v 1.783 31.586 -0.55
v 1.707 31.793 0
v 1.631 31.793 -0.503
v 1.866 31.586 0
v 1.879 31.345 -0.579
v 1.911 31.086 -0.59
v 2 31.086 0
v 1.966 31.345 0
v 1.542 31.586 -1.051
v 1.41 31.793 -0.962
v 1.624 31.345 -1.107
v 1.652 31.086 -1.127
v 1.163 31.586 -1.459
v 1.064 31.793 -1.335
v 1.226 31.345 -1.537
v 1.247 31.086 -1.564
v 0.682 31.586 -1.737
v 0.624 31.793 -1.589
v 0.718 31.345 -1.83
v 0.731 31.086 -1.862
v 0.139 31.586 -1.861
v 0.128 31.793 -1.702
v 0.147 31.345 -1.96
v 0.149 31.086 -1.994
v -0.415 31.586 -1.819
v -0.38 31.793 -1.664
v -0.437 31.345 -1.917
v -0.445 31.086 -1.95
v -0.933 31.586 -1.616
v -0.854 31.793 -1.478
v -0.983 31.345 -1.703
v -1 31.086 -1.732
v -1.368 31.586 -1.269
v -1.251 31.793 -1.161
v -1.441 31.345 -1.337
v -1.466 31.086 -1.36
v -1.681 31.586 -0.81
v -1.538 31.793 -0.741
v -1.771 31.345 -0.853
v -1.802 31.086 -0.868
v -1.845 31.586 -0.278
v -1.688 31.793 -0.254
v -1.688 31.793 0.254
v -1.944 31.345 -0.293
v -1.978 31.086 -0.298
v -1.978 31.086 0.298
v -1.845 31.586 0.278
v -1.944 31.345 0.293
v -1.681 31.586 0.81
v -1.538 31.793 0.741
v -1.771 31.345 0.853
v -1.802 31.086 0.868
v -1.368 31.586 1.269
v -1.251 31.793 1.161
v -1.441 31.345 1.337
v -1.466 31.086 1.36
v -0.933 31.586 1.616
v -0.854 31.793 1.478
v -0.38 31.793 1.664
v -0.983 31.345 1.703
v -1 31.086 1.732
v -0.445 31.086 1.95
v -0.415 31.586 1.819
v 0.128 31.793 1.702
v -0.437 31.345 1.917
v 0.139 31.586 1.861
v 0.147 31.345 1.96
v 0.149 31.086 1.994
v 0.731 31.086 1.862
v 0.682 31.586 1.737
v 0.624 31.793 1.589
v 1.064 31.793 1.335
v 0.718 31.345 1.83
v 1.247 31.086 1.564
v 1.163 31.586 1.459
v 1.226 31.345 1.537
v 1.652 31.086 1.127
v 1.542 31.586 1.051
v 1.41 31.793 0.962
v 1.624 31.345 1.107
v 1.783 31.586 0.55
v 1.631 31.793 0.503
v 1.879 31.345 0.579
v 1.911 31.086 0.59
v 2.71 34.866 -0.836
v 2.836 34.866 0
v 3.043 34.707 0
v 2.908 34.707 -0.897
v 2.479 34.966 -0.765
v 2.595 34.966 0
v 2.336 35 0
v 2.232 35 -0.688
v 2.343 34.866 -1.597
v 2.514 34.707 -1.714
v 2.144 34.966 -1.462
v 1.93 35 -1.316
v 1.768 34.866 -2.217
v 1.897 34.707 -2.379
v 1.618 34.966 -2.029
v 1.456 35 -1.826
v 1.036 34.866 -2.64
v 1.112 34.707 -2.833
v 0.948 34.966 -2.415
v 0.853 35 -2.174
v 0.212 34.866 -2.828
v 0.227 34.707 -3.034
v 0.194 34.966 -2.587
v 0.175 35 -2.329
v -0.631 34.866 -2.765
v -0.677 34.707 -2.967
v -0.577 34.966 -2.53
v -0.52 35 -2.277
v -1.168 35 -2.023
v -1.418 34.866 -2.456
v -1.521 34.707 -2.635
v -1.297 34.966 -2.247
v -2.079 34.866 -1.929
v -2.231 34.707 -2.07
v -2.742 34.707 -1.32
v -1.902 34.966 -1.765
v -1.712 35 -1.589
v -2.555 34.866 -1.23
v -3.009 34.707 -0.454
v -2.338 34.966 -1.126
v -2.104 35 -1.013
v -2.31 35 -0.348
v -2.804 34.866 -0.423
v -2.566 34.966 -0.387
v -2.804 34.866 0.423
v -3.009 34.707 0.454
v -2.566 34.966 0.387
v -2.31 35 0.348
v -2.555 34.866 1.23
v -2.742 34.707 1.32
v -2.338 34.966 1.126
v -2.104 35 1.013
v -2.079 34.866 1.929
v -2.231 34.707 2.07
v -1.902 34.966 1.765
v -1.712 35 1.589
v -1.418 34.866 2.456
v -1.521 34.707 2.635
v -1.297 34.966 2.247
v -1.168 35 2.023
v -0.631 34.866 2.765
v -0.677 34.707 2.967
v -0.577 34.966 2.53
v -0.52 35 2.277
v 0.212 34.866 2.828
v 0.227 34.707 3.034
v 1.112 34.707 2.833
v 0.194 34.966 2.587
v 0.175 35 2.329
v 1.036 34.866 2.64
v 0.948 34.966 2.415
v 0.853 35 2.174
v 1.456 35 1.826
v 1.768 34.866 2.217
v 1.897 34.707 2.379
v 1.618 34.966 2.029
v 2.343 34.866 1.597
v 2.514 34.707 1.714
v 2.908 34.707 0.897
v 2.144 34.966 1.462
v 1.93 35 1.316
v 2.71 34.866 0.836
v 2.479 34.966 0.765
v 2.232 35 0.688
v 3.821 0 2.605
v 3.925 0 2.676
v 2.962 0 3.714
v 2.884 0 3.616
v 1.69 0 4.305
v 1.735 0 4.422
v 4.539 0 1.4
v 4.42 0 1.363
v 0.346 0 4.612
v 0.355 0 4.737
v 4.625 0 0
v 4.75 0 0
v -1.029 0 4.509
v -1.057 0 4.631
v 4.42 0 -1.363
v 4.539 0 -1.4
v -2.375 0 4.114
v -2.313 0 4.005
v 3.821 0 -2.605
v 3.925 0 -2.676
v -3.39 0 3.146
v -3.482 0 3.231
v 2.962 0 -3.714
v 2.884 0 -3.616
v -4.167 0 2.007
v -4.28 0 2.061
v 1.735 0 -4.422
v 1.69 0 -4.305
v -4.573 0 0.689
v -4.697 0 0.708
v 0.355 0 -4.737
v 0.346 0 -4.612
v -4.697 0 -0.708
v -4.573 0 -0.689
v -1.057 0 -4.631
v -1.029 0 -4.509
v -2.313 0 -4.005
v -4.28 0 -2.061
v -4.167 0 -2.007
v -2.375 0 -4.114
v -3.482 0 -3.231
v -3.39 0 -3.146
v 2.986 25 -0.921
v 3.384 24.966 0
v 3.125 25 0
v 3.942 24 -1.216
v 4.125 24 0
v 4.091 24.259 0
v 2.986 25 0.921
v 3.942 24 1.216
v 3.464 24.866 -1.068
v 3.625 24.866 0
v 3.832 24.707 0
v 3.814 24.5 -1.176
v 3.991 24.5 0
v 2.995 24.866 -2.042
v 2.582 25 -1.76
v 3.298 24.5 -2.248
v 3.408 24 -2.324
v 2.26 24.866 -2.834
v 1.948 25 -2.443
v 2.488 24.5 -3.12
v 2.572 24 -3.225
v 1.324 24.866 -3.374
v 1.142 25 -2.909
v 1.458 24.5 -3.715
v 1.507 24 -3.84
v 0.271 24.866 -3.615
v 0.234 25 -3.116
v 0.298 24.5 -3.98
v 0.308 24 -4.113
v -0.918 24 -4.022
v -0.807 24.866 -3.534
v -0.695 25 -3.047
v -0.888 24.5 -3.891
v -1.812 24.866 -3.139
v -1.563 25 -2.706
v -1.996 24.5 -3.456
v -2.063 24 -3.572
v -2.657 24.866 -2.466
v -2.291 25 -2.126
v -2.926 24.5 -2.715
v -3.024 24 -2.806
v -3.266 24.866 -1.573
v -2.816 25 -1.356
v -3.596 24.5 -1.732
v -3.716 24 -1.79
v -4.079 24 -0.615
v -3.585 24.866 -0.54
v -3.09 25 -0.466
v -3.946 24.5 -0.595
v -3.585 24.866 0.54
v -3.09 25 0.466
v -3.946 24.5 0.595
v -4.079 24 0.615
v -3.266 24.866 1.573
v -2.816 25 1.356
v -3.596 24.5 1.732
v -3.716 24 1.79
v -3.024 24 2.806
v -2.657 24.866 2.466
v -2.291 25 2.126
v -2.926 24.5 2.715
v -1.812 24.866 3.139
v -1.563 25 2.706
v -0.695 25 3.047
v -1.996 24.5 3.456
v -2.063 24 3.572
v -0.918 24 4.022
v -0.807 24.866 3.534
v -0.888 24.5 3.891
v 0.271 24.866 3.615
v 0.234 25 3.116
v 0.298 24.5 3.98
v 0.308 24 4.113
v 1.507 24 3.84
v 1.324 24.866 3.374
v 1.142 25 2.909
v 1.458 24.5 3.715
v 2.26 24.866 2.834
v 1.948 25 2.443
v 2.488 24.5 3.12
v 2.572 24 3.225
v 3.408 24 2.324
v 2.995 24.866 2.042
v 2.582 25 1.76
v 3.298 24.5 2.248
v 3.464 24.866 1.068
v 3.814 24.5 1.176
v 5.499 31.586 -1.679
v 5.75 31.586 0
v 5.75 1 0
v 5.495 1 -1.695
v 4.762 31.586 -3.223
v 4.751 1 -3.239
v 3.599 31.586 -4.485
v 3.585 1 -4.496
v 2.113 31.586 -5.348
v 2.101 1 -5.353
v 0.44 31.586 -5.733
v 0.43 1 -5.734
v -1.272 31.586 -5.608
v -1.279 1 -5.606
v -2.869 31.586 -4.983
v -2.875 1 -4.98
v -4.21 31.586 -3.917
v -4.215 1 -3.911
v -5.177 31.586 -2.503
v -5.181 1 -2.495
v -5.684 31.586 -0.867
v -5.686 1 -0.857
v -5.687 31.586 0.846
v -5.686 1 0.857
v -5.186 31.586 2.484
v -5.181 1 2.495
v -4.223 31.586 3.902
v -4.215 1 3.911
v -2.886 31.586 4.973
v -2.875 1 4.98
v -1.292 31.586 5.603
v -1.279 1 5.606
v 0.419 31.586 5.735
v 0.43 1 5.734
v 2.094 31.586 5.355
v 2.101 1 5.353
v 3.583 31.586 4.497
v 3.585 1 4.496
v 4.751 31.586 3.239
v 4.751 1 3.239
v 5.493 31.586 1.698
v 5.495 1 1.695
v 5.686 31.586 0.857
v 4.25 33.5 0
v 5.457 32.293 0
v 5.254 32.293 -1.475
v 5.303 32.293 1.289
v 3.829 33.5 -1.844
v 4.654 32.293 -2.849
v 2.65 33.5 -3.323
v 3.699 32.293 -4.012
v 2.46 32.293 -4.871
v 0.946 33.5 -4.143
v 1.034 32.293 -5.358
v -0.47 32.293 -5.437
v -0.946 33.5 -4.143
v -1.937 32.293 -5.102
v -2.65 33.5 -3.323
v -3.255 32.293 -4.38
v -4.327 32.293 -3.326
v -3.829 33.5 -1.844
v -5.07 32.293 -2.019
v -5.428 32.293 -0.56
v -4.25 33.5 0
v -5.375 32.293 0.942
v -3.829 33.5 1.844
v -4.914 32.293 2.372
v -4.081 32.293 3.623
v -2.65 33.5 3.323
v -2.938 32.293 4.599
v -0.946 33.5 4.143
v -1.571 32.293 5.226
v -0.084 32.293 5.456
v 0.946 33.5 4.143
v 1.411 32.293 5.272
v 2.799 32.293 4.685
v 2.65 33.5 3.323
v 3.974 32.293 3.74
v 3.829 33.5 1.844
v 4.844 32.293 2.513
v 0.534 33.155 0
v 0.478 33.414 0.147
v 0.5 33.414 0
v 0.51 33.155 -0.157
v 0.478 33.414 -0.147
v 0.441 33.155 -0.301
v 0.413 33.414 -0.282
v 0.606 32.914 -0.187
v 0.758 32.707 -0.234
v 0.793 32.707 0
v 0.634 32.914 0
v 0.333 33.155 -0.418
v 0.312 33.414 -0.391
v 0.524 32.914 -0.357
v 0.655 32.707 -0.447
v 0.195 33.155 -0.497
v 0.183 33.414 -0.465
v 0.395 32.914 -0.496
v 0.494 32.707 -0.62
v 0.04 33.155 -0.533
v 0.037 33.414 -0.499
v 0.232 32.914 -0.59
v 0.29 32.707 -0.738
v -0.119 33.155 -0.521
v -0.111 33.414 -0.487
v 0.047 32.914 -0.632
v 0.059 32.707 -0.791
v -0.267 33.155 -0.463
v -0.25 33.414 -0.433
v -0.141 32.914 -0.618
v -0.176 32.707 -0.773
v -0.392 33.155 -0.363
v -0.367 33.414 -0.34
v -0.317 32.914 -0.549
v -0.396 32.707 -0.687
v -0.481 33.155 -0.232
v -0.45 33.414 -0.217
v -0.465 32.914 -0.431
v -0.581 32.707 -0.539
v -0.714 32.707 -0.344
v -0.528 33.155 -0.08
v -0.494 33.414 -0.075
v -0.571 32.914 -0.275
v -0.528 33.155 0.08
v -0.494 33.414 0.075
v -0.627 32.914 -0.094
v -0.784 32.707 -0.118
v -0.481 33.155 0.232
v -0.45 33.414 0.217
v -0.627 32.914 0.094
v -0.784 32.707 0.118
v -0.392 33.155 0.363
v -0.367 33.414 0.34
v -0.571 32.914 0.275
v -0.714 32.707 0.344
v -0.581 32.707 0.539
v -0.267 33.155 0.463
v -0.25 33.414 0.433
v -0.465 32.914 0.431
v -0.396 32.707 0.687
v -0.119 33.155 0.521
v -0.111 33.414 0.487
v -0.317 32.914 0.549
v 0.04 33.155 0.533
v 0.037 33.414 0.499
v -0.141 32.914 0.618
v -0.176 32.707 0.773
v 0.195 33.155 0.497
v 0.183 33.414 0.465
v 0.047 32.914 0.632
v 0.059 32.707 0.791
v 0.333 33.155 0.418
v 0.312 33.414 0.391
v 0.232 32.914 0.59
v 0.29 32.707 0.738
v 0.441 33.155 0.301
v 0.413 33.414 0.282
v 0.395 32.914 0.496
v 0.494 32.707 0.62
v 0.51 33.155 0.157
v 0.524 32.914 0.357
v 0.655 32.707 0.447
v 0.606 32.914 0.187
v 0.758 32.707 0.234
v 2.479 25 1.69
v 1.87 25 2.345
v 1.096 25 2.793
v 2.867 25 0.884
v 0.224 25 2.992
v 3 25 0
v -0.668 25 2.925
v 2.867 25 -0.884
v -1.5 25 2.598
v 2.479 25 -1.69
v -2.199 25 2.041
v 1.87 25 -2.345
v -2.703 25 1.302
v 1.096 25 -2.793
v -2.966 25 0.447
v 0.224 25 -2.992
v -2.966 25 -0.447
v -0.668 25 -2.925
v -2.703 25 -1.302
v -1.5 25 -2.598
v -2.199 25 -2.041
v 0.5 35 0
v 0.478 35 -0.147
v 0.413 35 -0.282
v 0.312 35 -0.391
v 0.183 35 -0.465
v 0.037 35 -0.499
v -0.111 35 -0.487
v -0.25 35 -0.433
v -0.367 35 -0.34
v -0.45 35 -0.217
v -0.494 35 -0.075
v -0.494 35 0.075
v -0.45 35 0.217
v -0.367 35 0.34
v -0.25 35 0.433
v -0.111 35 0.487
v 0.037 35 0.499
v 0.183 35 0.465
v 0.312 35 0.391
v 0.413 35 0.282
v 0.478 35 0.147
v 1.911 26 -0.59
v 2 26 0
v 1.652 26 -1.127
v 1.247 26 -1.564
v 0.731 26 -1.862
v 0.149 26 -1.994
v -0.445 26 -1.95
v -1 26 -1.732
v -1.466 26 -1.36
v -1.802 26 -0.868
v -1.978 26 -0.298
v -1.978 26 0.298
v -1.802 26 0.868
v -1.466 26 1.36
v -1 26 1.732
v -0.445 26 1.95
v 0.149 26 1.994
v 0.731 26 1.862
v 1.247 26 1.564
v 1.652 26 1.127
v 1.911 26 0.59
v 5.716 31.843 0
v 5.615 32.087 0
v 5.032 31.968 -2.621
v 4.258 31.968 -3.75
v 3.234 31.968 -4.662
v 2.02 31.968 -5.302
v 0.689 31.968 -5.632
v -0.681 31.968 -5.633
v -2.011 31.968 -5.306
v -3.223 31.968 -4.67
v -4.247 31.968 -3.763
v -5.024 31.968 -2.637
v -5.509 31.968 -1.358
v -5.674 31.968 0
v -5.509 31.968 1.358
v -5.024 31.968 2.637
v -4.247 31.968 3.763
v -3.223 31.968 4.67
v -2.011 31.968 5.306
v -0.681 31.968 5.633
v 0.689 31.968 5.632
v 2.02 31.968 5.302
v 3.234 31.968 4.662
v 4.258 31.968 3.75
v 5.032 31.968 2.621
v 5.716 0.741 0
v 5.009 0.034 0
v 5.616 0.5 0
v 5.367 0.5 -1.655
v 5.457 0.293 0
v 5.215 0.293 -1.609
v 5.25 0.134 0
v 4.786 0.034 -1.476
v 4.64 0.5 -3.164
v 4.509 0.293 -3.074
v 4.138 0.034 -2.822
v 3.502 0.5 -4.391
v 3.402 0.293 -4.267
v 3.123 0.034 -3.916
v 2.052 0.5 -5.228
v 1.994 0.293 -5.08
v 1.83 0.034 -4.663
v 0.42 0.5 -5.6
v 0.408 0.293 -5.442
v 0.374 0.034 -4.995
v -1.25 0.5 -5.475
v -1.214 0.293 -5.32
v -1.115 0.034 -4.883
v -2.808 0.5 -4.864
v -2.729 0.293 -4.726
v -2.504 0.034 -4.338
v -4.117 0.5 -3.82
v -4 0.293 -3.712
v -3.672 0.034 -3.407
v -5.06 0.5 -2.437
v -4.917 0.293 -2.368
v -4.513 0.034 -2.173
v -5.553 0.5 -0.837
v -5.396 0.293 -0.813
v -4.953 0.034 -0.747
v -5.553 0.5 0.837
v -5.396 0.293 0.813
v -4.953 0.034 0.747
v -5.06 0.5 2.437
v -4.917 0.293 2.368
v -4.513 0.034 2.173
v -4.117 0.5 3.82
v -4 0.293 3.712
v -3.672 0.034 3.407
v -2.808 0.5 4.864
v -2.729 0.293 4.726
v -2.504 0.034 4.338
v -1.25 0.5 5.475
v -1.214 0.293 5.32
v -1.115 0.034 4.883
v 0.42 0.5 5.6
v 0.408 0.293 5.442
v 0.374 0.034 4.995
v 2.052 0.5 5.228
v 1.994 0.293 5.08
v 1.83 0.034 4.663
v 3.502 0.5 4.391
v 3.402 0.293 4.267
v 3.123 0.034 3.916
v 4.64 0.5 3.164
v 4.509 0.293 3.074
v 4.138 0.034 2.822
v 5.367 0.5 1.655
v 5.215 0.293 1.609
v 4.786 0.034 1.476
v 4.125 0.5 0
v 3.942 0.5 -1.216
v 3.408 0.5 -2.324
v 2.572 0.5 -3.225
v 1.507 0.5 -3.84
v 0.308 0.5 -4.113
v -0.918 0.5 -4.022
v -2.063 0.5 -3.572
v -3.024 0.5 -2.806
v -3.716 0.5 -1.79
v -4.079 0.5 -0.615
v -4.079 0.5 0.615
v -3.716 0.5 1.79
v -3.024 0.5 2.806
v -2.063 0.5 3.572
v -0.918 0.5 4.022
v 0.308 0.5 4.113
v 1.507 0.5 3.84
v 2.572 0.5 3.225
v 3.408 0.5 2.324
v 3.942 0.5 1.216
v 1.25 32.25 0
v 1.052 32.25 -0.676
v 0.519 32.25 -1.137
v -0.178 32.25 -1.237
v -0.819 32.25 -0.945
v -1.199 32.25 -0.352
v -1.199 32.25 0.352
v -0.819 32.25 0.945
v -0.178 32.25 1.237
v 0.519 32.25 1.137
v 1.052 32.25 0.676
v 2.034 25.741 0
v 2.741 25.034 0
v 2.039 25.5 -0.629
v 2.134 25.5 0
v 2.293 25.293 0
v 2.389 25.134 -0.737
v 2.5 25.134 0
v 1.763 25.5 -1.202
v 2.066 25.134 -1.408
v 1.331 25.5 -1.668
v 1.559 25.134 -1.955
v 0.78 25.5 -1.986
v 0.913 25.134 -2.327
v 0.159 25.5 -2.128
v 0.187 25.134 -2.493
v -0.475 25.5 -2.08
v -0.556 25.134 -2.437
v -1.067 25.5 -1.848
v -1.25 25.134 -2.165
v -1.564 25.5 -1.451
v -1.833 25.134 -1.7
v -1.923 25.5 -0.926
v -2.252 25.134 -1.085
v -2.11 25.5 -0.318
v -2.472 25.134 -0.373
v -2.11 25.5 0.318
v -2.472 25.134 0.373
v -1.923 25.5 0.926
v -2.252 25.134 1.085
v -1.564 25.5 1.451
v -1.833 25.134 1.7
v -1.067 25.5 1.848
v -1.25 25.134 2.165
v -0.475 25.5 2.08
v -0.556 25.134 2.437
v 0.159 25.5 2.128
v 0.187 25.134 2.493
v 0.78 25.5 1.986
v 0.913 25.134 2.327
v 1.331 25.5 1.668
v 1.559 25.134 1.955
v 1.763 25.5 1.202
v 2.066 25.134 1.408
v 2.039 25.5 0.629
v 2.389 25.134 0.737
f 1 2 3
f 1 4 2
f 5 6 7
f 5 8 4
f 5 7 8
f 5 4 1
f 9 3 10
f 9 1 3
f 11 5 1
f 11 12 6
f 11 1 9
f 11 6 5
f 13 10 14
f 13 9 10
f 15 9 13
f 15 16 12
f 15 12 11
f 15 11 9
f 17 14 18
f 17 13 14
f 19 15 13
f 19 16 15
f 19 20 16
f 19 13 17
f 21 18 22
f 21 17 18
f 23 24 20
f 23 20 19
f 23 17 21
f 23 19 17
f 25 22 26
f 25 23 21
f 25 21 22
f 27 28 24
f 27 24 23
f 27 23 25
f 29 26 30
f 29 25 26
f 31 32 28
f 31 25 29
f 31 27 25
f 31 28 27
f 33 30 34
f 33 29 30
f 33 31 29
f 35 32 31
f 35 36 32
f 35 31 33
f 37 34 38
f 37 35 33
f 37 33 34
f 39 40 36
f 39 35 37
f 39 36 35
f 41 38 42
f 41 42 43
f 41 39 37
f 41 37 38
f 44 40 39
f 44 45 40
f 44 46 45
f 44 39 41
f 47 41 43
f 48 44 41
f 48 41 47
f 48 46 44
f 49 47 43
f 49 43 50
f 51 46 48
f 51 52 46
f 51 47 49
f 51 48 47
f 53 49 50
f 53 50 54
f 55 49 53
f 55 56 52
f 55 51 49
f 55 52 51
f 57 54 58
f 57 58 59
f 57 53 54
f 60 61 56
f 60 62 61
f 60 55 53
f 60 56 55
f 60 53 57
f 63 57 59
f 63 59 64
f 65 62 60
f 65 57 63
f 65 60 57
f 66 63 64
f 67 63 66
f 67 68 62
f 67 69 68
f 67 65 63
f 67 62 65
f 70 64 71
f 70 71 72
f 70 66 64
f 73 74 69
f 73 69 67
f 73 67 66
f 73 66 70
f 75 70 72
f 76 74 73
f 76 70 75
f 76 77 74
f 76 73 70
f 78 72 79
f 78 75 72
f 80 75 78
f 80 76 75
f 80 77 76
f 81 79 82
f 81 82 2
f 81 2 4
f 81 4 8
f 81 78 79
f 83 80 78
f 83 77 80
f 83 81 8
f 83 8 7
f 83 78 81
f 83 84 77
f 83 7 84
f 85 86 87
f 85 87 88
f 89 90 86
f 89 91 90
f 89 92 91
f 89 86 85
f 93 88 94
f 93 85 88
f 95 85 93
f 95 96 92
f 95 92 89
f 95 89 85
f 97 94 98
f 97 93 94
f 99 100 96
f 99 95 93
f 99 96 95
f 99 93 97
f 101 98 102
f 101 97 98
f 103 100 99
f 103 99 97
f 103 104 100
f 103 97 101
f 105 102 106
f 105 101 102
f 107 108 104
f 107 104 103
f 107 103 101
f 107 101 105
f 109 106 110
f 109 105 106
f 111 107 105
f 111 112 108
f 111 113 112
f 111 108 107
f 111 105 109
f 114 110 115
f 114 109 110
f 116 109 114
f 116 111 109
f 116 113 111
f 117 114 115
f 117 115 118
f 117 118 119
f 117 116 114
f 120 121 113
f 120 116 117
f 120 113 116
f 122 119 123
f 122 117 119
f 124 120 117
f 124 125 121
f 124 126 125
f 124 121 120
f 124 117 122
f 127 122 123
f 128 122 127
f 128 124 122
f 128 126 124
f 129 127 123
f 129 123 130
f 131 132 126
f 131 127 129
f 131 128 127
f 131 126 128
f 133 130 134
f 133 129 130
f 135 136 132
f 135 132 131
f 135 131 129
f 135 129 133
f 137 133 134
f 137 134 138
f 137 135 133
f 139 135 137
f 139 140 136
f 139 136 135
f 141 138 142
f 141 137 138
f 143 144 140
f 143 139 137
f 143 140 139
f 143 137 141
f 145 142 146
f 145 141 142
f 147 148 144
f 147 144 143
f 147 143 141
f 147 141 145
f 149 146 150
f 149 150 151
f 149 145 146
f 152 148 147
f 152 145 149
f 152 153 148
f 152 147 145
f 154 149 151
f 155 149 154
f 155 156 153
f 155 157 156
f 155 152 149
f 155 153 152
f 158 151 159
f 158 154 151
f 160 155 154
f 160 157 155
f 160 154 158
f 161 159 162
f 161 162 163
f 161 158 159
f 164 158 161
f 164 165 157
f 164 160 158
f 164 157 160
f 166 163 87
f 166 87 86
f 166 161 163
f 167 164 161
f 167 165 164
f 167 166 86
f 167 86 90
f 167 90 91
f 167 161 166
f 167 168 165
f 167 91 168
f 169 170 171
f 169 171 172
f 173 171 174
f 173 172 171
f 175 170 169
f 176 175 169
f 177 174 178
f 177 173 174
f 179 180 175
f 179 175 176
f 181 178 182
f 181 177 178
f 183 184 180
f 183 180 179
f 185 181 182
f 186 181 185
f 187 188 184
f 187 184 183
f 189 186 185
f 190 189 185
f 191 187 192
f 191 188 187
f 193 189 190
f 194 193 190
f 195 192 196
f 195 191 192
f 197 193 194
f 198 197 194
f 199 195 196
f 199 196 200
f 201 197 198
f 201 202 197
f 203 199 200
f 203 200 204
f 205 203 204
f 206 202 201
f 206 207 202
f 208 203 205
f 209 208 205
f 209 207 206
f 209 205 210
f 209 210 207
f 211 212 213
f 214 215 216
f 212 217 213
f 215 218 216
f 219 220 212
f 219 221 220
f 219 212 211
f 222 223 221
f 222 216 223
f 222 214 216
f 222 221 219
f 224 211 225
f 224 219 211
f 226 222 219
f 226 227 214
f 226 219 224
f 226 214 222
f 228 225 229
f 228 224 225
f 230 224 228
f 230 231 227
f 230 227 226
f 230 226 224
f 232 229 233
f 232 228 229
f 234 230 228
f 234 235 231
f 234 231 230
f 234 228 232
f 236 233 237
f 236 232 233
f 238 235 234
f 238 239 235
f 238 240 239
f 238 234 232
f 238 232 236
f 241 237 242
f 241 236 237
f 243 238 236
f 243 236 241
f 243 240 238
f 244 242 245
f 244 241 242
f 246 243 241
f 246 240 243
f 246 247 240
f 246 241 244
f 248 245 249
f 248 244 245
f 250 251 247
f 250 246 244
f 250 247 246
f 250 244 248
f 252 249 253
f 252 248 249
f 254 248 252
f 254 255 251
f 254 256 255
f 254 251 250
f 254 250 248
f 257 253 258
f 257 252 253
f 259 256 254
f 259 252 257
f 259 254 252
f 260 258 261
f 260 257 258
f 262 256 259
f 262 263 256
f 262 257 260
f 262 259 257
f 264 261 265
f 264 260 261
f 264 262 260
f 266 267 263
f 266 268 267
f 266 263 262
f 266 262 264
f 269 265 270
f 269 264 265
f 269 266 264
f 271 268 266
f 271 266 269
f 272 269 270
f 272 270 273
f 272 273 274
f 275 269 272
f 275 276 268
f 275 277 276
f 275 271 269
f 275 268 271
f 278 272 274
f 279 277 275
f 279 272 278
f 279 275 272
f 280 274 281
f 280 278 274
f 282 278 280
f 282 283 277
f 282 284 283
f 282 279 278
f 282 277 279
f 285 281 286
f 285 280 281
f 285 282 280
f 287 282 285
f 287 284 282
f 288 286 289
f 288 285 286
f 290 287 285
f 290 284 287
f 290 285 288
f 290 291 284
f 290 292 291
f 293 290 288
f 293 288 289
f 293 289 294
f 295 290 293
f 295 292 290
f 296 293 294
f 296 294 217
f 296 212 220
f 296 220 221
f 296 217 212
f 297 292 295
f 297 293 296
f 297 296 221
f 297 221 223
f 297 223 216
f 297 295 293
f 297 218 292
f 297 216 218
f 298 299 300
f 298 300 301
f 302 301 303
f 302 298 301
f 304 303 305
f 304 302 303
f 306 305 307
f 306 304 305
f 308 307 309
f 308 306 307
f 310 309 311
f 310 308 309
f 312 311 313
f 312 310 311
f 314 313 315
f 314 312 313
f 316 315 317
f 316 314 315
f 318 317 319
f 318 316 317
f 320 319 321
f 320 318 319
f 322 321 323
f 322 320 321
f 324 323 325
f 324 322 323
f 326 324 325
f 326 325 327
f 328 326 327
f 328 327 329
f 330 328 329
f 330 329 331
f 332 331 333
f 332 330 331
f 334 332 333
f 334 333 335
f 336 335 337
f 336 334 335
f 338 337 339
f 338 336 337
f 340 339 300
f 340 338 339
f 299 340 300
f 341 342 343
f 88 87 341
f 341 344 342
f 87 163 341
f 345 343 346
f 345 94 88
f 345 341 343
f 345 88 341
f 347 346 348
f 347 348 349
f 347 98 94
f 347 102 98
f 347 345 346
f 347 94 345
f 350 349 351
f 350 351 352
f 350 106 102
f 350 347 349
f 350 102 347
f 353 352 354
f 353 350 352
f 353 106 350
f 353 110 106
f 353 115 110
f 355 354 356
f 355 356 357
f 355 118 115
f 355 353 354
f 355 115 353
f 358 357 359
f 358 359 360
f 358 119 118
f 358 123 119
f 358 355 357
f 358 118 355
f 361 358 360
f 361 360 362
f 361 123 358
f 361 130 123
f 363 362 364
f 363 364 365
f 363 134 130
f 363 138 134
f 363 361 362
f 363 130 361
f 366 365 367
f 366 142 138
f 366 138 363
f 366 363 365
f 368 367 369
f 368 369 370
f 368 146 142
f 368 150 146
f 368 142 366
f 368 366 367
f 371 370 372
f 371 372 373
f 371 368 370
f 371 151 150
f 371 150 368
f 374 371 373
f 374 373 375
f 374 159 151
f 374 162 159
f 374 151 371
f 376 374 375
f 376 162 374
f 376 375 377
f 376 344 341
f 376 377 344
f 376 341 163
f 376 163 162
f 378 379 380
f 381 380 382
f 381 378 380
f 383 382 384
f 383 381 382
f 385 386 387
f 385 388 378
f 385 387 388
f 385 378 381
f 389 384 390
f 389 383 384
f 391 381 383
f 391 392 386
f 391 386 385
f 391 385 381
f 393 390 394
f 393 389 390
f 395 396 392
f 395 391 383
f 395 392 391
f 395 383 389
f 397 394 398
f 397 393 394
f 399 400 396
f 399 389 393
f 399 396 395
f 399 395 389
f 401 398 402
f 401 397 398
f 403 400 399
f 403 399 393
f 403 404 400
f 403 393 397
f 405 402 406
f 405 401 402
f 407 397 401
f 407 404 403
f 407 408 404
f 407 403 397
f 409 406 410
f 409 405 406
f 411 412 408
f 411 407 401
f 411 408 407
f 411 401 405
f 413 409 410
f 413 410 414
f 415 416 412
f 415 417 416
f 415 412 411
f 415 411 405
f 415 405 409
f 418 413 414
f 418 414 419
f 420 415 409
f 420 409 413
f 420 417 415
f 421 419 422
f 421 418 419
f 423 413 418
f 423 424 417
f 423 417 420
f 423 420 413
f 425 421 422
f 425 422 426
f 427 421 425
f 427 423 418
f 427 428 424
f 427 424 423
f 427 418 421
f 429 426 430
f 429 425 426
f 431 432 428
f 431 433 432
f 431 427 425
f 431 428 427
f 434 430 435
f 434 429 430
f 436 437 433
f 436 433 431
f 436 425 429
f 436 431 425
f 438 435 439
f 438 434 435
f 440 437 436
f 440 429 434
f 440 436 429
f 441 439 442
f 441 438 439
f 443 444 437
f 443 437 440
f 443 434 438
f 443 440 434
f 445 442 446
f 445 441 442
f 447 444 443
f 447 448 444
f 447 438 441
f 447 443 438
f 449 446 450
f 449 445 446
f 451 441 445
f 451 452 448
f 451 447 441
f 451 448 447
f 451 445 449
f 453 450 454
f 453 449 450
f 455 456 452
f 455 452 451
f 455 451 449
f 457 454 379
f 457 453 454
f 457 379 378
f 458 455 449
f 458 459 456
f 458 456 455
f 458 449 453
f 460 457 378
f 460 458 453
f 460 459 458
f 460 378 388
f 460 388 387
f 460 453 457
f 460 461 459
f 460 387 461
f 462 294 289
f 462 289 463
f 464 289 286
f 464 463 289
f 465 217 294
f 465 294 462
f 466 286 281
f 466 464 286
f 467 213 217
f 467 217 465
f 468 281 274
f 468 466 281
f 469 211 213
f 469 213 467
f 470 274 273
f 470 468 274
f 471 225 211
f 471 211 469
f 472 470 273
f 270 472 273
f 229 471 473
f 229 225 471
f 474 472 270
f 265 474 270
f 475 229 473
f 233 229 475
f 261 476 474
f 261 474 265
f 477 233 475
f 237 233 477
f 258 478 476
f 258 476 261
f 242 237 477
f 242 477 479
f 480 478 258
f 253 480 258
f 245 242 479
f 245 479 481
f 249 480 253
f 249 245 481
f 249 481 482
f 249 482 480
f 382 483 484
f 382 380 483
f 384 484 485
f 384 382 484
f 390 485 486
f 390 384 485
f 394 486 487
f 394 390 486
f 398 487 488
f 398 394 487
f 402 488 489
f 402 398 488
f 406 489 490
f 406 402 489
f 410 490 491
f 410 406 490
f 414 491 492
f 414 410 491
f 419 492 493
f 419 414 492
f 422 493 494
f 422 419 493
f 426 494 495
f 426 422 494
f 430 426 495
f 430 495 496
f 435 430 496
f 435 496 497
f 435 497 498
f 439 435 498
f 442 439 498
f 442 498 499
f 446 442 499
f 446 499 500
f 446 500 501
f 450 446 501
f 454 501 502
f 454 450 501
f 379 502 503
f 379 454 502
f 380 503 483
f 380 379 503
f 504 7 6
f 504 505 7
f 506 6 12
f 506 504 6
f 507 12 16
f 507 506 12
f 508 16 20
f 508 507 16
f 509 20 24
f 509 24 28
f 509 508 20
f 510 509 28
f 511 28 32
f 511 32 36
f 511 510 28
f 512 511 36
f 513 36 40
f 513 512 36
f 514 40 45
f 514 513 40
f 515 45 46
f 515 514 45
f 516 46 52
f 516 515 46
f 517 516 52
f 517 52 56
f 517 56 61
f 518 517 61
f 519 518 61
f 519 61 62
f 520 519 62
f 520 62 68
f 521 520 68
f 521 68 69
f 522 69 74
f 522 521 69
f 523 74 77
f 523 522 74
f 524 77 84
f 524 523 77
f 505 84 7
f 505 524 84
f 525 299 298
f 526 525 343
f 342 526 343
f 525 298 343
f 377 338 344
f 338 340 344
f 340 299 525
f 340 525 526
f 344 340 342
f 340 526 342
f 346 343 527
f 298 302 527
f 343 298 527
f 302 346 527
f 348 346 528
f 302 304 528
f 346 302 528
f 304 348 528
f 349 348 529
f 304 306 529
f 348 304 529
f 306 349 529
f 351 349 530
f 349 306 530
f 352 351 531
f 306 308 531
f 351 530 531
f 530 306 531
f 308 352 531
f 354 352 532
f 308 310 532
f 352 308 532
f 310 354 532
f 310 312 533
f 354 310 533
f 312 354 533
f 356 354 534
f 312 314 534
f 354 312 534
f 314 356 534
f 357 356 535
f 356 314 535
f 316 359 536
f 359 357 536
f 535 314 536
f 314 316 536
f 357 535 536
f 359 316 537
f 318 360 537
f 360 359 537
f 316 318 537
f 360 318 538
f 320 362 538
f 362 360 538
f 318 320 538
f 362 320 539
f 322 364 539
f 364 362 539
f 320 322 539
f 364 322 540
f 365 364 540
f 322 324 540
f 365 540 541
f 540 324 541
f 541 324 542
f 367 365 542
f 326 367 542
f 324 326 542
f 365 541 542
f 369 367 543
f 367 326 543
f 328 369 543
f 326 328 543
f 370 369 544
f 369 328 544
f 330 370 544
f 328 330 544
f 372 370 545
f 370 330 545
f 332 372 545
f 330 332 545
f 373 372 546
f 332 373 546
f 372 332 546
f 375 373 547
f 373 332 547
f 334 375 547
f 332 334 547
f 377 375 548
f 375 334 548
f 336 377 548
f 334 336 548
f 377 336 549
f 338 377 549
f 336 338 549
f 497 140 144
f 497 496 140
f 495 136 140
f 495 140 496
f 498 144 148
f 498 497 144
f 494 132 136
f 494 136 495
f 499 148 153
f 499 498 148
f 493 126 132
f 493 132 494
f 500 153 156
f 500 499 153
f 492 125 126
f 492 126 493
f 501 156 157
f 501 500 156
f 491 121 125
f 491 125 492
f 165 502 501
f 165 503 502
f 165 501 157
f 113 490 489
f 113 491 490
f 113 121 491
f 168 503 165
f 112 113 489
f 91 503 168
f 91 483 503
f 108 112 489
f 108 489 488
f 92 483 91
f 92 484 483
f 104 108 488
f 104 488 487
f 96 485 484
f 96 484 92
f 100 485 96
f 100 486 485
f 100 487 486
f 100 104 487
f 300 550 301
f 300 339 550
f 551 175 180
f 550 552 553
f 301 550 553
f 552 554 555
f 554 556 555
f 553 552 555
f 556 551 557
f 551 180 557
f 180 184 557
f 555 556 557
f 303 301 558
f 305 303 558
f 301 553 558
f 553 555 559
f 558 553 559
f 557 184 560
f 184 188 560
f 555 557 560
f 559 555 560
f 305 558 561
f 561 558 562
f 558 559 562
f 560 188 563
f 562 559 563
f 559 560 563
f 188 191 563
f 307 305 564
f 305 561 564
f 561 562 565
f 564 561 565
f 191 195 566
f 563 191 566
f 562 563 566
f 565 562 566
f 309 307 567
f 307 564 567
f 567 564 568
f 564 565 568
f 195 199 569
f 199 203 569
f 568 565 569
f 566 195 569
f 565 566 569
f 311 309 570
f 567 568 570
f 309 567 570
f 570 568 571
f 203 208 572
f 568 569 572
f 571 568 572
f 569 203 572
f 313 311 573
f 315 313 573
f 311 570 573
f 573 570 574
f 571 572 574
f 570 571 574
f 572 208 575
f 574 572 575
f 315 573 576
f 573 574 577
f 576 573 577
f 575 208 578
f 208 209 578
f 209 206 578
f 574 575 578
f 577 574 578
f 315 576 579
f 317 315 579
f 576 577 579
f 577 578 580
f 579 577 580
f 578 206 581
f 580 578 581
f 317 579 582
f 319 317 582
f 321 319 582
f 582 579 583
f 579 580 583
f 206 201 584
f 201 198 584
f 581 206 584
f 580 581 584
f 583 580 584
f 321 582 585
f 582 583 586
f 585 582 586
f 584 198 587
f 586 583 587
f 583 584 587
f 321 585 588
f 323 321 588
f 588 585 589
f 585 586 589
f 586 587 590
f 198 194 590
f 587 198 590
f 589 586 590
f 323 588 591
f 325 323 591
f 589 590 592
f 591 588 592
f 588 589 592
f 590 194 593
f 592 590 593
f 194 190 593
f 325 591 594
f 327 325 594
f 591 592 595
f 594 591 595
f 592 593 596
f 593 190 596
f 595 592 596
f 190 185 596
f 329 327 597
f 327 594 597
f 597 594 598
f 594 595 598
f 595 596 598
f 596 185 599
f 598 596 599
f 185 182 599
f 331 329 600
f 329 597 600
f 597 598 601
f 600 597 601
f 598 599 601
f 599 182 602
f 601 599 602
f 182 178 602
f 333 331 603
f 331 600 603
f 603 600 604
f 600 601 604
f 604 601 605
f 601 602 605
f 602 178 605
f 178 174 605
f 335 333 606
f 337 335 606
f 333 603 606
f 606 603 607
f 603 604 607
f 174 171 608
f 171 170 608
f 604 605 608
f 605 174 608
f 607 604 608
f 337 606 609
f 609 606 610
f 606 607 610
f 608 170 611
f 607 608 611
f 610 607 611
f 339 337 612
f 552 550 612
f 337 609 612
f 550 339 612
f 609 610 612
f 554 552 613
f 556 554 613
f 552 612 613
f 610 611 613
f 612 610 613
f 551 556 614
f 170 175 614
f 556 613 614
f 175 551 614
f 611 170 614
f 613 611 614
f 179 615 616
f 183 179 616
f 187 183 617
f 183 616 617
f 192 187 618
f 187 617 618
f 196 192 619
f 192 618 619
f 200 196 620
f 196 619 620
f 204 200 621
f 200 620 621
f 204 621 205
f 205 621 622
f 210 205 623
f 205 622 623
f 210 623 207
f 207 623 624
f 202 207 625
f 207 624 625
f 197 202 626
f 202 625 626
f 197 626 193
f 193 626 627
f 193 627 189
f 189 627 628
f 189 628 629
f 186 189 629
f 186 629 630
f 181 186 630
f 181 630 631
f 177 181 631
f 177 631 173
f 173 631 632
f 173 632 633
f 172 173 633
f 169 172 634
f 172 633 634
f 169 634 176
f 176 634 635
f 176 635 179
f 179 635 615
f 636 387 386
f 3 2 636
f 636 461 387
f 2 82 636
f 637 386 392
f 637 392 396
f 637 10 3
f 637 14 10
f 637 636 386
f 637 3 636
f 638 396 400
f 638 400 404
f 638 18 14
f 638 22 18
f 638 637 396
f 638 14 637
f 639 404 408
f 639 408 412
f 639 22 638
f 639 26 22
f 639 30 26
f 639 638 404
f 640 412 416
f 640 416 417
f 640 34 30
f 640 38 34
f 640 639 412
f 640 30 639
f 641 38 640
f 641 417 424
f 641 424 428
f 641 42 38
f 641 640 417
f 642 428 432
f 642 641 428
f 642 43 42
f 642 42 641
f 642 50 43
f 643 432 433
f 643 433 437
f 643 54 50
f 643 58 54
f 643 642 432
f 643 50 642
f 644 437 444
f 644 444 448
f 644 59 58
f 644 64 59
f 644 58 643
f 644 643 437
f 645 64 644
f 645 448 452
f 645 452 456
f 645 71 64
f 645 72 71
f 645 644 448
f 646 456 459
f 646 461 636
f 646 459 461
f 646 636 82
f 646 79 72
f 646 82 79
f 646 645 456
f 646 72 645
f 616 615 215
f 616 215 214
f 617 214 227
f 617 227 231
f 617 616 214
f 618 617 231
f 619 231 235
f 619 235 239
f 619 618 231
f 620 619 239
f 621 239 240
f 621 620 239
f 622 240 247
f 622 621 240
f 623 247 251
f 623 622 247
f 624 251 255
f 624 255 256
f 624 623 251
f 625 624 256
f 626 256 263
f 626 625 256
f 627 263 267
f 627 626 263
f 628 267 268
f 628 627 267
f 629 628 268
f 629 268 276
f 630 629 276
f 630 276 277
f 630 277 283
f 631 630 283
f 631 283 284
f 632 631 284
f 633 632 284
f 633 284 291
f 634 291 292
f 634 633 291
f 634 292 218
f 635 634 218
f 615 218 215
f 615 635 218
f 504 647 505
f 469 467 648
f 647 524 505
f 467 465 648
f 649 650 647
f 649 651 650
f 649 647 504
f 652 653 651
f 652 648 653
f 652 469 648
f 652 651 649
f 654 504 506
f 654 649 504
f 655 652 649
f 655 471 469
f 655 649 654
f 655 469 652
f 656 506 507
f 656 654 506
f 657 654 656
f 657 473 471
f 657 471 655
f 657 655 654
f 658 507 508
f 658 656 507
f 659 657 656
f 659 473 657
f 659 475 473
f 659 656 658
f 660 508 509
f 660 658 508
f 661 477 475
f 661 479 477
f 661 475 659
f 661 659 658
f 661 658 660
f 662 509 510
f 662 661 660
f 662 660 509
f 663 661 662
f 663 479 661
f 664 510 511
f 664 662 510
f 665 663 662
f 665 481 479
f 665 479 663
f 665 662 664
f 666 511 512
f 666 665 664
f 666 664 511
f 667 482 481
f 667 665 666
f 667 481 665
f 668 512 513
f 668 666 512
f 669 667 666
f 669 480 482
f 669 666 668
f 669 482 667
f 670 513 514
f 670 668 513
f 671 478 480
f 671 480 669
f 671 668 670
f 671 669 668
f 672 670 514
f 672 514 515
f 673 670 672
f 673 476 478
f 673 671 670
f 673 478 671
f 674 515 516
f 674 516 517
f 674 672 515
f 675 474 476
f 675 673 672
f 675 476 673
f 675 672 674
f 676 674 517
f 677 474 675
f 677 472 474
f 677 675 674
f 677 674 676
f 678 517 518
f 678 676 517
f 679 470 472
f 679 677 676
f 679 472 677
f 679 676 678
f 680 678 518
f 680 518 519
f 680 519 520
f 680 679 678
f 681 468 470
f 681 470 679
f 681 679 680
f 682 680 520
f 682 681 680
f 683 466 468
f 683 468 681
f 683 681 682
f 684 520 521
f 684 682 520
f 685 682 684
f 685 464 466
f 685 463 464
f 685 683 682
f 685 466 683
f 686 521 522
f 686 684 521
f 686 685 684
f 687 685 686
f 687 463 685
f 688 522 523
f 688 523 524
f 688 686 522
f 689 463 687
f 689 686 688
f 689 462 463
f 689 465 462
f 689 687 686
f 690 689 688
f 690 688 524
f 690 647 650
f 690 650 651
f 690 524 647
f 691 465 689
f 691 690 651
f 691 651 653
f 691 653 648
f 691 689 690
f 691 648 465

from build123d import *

# Parameters (mm, degrees)
CHAMFER1_SIZE = 3
FILLET1_R     = 1
CHAMFER2_SIZE = 0.5


with BuildPart() as part:
    # Sketch1 → Revolve1 (revolve)
    with BuildSketch(Plane.XY):
        with BuildLine():
            Line((5.75, 0), (5.75, 35))
            Line((5.75, 35), (0.5, 35))
            Line((0.5, 35), (0.5, 33.414213562))
            ThreePointArc((0.5, 33.414213562), (0.576120467, 33.03153013), (0.792893219, 32.707106781))
            Line((0.792893219, 32.707106781), (1.707106781, 31.792893219))
            ThreePointArc((1.707106781, 31.792893219), (1.923879533, 31.46846987), (2, 31.085786438))
            Line((2, 31.085786438), (2, 26))
            ThreePointArc((2, 26), (2.292893219, 25.292893219), (3, 25))
            Line((3, 25), (3.125, 25))
            ThreePointArc((3.125, 25), (3.832106781, 24.707106781), (4.125, 24))
            Line((4.125, 24), (4.125, 0))
            Line((4.125, 0), (5.75, 0))
        make_face()
    revolve(axis=Axis((0, -1000, 0), (0, 1, 0)))

    # Chamfer1
    chamfer1_edges = [part.edges().sort_by_distance(p)[0] for p in [
        (-5.75, 35, 0),
    ]]
    chamfer(chamfer1_edges, length=CHAMFER1_SIZE)

    # Fillet1
    fillet1_edges = [part.edges().sort_by_distance(p)[0] for p in [
        (-5.75, 0, 0),
        (-5.75, 32, 0),
        (-2.75, 35, 0),
    ]]
    fillet(fillet1_edges, radius=FILLET1_R)

    # Chamfer2
    chamfer2_edges = [part.edges().sort_by_distance(p)[0] for p in [
        (-4.125, 0, 0),
    ]]
    chamfer(chamfer2_edges, length=CHAMFER2_SIZE)


solid = part.part
